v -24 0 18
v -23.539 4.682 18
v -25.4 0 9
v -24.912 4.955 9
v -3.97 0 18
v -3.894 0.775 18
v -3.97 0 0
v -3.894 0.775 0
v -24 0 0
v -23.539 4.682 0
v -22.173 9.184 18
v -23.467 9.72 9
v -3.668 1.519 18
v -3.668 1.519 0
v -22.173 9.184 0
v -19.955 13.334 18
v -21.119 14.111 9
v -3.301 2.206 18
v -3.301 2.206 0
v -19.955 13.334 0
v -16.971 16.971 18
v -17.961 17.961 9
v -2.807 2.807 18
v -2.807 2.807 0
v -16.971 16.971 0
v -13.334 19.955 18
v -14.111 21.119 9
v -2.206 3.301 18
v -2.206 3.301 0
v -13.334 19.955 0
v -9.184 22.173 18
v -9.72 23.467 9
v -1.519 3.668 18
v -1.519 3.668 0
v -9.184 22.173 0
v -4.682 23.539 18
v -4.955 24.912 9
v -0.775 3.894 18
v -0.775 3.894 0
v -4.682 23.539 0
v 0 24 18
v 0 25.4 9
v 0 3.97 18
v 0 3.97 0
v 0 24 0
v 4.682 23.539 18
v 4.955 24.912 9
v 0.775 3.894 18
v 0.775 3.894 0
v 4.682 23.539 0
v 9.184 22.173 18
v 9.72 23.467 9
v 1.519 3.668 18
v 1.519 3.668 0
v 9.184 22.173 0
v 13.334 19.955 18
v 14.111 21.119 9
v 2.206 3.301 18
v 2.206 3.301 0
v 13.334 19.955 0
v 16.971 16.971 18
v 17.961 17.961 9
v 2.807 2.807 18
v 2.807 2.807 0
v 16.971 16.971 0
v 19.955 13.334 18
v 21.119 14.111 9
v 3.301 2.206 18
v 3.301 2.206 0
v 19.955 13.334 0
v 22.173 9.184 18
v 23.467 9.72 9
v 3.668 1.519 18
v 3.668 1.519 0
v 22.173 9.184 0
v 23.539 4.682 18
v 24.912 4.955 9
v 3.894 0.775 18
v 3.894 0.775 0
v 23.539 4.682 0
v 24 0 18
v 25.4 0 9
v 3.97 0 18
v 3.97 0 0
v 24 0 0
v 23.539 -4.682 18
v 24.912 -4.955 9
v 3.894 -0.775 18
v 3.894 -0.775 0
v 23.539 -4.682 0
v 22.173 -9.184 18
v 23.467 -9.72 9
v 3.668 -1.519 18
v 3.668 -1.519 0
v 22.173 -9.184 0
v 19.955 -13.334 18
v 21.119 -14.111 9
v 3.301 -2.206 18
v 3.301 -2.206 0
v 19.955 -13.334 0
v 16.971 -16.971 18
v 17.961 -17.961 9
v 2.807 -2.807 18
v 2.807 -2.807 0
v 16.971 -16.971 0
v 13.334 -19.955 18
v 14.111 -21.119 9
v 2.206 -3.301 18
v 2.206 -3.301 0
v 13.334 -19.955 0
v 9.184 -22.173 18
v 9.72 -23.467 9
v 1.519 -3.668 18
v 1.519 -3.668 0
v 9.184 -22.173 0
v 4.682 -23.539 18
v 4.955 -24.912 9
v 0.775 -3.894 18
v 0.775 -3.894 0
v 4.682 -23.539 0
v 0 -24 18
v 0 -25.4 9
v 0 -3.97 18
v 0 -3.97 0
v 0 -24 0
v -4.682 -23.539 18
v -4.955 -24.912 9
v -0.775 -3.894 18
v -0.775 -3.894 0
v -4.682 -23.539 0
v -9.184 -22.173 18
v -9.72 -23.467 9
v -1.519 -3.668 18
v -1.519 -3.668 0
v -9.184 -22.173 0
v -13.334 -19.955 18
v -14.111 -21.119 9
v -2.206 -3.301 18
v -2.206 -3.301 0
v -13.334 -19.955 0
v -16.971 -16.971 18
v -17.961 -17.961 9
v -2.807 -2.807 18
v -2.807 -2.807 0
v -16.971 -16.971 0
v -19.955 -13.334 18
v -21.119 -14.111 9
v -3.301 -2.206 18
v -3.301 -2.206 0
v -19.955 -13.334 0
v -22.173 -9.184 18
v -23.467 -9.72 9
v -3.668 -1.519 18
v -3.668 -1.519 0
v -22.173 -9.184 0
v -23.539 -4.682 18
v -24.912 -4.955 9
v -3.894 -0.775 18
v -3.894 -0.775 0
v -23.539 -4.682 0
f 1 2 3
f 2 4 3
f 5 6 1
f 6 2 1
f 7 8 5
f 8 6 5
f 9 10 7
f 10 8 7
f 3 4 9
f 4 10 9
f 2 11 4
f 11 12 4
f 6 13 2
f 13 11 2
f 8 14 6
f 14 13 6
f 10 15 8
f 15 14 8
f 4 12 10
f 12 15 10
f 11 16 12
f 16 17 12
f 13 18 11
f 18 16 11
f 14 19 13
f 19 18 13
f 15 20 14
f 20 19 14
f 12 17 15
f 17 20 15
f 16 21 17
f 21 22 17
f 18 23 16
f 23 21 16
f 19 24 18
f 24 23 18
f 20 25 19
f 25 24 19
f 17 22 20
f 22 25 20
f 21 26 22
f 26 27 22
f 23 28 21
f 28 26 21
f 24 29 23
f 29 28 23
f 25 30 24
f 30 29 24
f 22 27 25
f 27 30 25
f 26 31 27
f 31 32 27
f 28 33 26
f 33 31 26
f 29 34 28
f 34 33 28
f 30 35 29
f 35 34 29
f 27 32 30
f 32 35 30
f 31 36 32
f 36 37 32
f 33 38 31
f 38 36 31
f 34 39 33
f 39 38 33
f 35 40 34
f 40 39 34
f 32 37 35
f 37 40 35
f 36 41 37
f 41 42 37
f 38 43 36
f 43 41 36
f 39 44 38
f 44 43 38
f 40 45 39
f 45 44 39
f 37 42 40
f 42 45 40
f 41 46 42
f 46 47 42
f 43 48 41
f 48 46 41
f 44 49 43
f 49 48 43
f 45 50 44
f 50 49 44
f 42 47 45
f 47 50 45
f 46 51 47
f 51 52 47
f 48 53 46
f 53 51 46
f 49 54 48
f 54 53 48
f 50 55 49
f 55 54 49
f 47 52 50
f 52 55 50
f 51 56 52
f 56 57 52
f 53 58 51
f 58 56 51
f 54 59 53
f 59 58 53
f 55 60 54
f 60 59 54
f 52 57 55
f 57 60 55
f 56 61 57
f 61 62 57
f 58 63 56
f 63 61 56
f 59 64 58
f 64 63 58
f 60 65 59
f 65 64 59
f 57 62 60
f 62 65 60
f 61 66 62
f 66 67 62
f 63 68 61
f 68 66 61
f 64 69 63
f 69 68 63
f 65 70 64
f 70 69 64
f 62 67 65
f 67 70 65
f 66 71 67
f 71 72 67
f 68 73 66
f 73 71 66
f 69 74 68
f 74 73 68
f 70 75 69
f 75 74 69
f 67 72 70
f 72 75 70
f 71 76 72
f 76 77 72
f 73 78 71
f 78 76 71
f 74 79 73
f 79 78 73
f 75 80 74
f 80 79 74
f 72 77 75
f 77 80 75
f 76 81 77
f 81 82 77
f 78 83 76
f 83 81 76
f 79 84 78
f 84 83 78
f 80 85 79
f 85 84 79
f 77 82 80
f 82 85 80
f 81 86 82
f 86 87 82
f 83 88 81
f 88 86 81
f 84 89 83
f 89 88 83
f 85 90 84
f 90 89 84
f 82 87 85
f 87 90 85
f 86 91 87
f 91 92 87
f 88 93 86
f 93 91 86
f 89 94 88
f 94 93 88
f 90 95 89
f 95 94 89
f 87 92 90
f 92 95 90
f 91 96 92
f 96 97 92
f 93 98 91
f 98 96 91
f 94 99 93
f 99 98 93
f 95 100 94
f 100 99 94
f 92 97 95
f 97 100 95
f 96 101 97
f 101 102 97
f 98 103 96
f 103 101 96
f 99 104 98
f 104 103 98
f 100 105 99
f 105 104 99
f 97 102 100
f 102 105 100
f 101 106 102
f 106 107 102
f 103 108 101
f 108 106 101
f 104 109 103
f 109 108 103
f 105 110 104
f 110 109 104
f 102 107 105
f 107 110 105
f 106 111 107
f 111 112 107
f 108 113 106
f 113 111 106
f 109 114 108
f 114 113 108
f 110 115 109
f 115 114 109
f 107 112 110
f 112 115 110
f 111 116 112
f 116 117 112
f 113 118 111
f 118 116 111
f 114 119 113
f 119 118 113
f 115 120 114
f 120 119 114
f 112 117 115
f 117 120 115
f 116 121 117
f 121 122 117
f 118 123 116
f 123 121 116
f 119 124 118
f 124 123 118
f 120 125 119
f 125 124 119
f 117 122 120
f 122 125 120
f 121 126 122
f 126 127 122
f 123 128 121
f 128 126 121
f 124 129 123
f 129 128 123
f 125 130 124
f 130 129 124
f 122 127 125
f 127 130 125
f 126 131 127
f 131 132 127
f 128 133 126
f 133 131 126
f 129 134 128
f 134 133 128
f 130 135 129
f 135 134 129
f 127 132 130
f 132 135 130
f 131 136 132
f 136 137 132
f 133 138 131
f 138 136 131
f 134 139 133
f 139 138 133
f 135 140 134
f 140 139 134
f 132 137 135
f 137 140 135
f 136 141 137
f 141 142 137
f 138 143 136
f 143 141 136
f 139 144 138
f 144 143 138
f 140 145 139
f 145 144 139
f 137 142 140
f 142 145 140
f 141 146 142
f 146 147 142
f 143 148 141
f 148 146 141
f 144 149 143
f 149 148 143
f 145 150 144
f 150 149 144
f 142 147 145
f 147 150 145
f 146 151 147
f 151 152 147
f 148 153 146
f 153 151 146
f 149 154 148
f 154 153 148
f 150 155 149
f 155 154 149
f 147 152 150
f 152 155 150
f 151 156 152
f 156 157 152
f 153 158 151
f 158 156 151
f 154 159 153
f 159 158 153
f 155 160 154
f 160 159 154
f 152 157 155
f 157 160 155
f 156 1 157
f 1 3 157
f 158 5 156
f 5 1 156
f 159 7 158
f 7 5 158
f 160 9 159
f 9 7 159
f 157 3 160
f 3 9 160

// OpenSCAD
$fn = 32;

// ----------------------------------------------------------------------
// Belt roller: 48 mm barrel, 18 mm wide, bore 7.94 mm
// ----------------------------------------------------------------------

// --- parameters (mm) ---
bore_d = 7.94;            // bore
barrel_d = 48;            // barrel diameter
roller_w = 18;            // roller width
crown = 1.4;              // crown height at mid width

roller_profile = [[3.97, 0], [24, 0], [25.4, 9], [24, 18], [3.97, 18]];

/* the profile stays clear of the axis, so the bore comes out of the revolve */
rotate_extrude() polygon(roller_profile);
